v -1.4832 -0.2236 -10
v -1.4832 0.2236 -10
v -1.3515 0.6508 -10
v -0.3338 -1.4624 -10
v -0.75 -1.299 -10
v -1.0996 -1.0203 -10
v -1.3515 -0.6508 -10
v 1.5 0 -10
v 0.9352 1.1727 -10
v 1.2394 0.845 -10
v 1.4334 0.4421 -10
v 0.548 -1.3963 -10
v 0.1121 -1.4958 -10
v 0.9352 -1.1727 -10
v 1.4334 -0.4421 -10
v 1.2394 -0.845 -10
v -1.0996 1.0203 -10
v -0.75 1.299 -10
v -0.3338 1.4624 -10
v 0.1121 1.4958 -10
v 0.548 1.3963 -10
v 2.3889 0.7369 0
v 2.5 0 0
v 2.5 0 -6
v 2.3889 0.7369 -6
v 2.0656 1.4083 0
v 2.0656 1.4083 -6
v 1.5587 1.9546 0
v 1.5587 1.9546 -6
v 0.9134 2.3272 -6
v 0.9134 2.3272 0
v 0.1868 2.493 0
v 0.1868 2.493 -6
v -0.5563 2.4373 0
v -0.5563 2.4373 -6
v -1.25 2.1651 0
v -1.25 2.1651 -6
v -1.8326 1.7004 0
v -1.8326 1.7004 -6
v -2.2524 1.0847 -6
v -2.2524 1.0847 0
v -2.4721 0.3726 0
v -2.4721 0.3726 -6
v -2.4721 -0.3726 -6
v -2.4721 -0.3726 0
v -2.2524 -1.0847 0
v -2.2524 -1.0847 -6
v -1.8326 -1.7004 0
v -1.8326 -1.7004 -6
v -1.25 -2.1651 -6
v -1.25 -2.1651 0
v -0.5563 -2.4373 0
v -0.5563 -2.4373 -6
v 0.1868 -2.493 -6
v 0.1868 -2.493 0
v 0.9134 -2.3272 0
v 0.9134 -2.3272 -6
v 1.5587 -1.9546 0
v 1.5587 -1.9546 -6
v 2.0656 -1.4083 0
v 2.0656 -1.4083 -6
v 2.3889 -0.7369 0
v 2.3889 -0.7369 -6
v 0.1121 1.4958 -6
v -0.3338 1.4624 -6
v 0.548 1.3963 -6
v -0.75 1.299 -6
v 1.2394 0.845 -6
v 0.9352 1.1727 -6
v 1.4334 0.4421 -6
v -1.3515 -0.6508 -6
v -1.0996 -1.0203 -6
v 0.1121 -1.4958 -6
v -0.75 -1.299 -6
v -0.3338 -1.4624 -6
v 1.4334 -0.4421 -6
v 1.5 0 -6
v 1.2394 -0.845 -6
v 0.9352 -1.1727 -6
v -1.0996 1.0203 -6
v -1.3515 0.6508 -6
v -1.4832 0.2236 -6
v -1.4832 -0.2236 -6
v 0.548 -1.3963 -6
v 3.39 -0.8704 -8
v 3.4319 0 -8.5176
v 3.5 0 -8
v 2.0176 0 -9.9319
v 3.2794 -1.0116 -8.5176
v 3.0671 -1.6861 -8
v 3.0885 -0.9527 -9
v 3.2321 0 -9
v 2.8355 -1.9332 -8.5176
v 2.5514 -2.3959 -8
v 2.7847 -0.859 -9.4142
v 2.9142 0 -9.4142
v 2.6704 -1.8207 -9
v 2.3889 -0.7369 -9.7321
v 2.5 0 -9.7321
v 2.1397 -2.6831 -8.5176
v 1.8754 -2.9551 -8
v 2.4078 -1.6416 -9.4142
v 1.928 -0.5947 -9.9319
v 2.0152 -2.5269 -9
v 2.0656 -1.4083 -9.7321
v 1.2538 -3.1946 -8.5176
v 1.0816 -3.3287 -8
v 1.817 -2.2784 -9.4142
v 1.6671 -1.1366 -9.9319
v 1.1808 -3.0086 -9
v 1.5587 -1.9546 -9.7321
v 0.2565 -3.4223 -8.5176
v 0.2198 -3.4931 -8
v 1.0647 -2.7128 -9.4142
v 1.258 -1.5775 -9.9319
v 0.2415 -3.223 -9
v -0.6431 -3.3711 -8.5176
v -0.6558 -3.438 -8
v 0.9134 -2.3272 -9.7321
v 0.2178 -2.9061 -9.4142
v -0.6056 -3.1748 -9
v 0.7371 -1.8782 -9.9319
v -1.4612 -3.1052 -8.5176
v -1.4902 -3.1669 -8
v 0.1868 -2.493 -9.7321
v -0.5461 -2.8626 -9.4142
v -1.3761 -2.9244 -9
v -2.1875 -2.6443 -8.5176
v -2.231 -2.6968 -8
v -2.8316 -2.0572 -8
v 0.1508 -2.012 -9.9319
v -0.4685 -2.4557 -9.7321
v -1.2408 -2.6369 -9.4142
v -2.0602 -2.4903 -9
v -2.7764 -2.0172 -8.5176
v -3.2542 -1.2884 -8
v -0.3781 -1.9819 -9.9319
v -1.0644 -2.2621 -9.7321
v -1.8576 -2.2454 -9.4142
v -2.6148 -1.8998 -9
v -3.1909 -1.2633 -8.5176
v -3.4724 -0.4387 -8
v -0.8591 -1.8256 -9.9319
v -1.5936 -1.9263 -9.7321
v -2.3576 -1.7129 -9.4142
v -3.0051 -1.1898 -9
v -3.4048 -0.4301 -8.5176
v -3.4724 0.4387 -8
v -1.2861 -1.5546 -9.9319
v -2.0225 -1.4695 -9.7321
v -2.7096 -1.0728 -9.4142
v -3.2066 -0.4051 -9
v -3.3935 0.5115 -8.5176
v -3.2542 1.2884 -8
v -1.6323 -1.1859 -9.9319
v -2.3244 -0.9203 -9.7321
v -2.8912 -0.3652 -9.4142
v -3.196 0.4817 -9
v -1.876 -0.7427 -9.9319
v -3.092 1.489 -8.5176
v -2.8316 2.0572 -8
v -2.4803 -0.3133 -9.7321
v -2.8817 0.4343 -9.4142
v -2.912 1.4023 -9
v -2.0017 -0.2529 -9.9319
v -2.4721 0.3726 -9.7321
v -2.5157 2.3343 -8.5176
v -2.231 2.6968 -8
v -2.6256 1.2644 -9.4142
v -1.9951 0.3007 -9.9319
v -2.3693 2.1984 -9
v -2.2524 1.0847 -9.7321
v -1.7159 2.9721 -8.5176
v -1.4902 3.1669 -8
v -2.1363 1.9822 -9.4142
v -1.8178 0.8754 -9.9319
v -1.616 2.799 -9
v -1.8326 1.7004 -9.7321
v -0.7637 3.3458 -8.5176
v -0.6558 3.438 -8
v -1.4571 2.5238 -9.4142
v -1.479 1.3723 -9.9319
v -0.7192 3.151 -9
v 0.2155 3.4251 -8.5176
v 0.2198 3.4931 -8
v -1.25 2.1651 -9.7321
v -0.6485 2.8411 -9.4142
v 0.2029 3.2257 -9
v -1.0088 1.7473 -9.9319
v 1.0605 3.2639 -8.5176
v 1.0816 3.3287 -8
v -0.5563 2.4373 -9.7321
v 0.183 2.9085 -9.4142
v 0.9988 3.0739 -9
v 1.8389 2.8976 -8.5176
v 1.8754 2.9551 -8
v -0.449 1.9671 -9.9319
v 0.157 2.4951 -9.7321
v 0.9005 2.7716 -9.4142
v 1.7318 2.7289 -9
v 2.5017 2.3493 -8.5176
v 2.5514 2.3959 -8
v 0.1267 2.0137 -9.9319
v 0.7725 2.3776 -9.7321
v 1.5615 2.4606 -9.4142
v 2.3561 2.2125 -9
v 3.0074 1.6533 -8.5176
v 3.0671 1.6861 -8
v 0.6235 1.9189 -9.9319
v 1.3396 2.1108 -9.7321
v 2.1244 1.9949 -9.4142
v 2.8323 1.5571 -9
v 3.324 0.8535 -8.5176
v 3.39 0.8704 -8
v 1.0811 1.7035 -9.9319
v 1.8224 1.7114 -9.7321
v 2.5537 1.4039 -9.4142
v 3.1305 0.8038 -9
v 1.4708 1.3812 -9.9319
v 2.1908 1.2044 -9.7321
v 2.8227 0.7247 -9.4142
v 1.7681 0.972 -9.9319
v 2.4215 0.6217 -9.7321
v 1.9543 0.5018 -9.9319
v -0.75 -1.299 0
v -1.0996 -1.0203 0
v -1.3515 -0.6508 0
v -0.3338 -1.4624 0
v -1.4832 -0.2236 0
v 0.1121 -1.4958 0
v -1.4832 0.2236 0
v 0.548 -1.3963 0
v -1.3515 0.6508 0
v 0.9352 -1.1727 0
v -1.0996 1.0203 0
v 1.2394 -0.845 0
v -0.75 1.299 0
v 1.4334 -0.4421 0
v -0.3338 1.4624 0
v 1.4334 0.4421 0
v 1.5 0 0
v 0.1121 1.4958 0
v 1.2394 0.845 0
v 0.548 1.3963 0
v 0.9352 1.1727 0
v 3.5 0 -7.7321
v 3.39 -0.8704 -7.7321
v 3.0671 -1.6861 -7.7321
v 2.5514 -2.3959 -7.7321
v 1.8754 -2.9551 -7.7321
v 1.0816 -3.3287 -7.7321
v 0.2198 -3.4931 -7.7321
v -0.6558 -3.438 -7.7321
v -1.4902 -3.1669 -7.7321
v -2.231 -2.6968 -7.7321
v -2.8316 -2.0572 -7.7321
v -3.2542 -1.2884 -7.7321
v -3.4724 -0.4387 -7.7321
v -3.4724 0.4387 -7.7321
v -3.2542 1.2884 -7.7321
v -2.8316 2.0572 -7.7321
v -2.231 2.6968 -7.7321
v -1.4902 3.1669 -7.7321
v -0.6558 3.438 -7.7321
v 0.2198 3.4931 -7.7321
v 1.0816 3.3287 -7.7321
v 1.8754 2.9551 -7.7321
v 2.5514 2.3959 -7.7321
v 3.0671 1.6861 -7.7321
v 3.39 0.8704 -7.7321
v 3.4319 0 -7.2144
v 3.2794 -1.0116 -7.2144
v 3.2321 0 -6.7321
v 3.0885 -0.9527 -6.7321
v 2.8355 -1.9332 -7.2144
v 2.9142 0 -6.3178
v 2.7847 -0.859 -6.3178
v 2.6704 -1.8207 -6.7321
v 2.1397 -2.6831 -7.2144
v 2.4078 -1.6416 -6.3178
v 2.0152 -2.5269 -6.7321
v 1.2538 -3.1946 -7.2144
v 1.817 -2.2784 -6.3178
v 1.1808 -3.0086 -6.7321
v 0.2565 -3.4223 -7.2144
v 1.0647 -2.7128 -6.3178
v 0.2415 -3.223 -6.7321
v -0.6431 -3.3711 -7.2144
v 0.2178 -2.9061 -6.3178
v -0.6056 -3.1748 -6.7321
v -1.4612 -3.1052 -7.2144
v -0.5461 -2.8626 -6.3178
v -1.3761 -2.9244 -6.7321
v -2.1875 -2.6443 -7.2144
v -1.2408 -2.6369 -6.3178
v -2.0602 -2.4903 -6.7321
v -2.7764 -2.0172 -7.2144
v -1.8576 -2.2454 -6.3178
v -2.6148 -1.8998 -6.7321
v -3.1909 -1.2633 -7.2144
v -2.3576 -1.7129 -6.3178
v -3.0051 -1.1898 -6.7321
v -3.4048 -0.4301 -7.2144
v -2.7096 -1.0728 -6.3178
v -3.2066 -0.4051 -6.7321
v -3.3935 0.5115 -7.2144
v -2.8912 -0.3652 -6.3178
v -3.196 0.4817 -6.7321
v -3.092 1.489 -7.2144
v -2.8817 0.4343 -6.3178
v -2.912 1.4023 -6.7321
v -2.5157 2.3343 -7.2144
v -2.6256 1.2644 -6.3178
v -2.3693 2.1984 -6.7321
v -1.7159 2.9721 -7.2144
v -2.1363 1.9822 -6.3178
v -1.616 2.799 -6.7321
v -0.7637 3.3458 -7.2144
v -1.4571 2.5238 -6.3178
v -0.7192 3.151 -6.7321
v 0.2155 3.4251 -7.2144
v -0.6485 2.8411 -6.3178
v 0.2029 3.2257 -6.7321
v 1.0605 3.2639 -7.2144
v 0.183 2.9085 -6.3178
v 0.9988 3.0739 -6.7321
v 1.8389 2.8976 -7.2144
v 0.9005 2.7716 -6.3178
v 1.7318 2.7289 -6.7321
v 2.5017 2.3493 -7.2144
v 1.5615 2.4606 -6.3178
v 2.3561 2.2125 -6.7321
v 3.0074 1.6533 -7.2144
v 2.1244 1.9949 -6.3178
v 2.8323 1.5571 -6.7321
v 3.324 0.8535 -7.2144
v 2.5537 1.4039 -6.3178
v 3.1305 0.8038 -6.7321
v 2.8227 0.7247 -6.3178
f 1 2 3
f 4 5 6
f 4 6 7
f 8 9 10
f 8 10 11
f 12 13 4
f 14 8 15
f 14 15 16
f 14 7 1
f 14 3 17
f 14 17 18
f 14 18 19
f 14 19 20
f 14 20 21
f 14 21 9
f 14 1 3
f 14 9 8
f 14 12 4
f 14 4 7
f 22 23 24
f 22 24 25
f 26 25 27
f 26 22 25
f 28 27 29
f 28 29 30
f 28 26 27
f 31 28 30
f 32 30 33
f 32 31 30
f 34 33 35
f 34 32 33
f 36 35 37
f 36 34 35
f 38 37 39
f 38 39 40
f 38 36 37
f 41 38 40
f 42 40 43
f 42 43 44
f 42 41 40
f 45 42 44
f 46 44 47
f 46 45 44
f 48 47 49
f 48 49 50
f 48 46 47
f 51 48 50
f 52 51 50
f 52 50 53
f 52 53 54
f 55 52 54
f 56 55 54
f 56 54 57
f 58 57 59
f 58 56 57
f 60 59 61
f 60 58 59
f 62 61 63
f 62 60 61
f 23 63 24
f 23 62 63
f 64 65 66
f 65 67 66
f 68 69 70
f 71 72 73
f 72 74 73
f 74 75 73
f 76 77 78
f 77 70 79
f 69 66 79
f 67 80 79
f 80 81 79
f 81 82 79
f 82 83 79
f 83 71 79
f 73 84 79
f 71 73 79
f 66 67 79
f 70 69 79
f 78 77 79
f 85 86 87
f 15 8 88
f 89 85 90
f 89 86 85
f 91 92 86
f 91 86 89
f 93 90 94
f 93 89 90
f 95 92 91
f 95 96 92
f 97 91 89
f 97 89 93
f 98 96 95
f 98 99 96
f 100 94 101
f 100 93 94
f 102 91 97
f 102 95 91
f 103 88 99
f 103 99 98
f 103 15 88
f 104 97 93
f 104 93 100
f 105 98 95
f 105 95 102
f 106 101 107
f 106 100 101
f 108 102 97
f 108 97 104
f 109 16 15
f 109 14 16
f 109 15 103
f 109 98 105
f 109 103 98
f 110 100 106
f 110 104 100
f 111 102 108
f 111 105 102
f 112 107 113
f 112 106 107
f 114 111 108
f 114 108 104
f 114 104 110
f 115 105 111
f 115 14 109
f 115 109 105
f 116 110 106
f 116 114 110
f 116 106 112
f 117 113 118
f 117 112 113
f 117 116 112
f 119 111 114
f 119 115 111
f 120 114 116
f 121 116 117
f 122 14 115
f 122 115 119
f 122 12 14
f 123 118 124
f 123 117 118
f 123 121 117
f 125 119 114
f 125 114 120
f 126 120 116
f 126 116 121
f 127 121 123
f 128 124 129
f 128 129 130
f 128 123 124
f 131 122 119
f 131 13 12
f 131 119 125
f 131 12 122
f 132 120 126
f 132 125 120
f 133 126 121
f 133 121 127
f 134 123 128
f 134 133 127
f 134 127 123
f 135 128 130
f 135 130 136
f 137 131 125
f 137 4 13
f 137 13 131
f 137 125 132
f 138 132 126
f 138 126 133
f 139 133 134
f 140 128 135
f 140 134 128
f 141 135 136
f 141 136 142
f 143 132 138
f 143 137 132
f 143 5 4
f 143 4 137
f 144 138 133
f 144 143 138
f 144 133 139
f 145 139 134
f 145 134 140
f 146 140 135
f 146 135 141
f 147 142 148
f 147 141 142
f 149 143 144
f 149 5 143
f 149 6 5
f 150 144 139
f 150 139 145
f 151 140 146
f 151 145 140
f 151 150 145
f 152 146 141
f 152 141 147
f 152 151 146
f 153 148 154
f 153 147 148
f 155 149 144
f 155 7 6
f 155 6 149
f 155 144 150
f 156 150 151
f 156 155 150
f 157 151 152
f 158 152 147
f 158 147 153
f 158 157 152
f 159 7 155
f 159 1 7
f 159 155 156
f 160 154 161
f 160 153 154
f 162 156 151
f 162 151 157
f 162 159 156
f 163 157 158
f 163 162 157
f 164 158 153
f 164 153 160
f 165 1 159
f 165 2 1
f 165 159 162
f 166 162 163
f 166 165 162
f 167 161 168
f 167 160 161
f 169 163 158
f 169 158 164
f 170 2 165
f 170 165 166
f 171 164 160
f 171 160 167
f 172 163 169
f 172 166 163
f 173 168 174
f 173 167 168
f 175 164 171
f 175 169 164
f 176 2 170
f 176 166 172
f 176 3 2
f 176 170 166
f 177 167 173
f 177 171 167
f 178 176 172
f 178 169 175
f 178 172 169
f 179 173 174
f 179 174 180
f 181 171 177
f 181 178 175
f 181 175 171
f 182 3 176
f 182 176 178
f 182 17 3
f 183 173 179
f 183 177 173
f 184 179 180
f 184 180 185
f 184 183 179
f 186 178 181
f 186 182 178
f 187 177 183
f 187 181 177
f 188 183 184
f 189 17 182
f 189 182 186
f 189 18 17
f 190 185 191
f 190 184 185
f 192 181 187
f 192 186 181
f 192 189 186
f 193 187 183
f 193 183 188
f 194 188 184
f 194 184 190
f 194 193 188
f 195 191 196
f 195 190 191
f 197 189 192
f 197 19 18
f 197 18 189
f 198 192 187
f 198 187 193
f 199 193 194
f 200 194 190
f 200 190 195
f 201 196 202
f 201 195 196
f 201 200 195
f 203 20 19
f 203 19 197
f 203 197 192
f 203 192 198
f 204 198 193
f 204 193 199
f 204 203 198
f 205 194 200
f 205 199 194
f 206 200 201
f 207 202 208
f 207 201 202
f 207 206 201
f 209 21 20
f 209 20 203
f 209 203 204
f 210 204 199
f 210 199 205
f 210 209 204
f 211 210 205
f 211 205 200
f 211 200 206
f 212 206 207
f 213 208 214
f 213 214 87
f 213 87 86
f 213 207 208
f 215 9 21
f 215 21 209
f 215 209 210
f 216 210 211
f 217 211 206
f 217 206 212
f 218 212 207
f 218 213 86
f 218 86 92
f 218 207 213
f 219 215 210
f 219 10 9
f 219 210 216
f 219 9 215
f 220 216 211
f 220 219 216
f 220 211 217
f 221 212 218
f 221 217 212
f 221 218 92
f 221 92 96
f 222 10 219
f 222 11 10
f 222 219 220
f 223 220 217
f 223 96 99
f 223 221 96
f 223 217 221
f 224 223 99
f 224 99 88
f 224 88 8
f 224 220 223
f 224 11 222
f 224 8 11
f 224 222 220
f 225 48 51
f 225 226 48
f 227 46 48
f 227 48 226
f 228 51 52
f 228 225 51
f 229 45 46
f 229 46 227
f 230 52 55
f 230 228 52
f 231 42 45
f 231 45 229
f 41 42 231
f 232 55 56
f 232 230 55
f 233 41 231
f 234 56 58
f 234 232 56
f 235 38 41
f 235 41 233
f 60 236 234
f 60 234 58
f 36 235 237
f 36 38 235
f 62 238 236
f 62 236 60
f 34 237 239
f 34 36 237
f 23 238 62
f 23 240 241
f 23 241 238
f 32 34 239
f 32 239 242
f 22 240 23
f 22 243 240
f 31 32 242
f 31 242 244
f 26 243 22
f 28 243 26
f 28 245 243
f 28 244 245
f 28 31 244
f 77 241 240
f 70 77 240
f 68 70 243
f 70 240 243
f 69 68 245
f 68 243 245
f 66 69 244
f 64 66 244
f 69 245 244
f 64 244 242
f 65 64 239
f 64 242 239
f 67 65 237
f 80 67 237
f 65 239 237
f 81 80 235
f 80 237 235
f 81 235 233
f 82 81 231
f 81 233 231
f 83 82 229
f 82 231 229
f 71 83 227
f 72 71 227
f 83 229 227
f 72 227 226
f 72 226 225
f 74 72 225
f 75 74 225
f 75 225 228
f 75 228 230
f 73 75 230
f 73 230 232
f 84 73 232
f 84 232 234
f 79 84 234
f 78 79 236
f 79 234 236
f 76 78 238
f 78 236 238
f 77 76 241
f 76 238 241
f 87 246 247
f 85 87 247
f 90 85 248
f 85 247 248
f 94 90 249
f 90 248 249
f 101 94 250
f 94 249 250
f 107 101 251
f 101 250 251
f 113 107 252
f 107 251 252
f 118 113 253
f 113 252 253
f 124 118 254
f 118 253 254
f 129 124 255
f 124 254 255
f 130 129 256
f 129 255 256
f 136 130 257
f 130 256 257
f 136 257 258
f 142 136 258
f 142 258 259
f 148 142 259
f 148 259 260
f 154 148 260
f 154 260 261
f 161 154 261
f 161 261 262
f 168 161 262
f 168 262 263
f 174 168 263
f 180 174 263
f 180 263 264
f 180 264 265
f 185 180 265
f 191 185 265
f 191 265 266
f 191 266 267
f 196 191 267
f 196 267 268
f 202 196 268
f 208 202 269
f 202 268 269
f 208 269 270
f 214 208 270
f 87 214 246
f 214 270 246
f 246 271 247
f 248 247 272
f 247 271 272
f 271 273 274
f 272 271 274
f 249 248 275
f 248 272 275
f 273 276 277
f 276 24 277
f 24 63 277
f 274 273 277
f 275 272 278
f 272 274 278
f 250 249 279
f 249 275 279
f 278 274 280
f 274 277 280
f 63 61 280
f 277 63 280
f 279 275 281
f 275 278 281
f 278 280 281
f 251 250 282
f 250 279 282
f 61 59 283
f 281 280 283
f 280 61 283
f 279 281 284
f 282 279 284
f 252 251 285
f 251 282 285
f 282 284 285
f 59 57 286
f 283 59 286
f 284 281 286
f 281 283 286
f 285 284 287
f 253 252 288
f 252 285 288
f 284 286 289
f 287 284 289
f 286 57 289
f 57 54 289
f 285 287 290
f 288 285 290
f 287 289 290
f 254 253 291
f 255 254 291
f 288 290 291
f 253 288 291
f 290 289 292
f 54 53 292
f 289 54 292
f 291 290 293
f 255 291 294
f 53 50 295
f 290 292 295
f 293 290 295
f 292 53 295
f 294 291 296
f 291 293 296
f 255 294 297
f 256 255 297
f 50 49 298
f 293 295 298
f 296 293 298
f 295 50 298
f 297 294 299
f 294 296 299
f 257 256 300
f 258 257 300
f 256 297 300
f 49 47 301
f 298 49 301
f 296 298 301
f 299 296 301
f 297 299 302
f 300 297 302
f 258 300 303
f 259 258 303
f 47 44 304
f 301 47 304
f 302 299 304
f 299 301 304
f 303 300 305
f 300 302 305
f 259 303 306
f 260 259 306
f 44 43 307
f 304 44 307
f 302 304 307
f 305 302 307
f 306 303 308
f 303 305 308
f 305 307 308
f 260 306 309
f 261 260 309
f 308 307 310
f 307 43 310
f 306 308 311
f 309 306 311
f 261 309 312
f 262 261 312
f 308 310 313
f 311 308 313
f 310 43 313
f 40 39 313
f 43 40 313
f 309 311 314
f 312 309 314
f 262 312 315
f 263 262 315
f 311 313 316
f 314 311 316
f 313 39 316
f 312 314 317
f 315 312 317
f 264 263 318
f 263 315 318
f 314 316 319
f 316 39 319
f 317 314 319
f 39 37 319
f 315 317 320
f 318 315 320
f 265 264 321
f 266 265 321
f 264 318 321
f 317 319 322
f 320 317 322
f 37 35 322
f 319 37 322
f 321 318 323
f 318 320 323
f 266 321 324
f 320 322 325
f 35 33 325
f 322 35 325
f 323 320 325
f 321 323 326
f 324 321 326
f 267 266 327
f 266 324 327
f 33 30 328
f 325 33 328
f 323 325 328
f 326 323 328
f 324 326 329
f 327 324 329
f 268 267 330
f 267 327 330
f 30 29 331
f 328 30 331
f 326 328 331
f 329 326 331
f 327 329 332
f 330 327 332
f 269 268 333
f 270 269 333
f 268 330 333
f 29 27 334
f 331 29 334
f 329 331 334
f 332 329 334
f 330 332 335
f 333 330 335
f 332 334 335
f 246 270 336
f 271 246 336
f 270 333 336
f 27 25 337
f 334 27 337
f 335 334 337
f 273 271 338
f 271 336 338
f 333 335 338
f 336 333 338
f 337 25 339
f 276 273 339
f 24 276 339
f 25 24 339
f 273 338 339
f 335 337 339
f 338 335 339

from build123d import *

# Parameters (mm, degrees)
F0_R     = 2.5
F0_R_2   = 1.5
F1_DEPTH = 6
F2_DEPTH = 7
F3_R     = 3.5
F3_R_2   = 2.5
F3_R_3   = 1.5
F4_DEPTH = 4


# Not quite as in the source:
# - a fillet or chamfer that OpenCascade refuses, or shapes differently, is made with other operations: its cross-section is extruded or revolved along the edge and cut away or added


with BuildPart() as f1:
    # F0 (on Top) → F1 (new body)
    with BuildSketch(Plane.XY):
        Circle(F0_R)
        Circle(F0_R_2, mode=Mode.SUBTRACT)
    extrude(amount=-F1_DEPTH)

    # F0 (on Top) → F2 (cut)
    with BuildSketch(Plane.XY):
        Circle(F0_R_2)
    extrude(amount=-F2_DEPTH, mode=Mode.SUBTRACT)

    # F3 (on face) → F4 (join)
    with BuildSketch(Plane(origin=(0, 0, -6), x_dir=(1, 0, 0), z_dir=(0, 0, -1))):
        Circle(F3_R)
        Circle(F3_R_2, mode=Mode.SUBTRACT)
        Circle(F3_R_2)
        Circle(F3_R_3, mode=Mode.SUBTRACT)
        Circle(F3_R_3)
    extrude(amount=F4_DEPTH)

    # F5: fillet of radius 2 on 2 edges, made by hand

    # F5_s1 → F5_t2 (revolve, cut)
    with BuildSketch(Plane.XZ):
        with BuildLine():
            ThreePointArc((3.5, -8), (2.9142135624, -9.4142135624), (1.5, -10))
            Line((1.5, -10), (3.5, -10))
            Line((3.5, -10), (3.5, -8))
        make_face()
    revolve(axis=Axis((0, 0, -10), (0, 0, -1)), mode=Mode.SUBTRACT)

    # F5_s3 → F5_t4 (revolve, cut)
    with BuildSketch(Plane.XZ):
        with BuildLine():
            ThreePointArc((3.5, -7.7320508076), (3.2320508076, -6.7320508076), (2.5, -6))
            Line((2.5, -6), (3.5, -6))
            Line((3.5, -6), (3.5, -7.7320508076))
        make_face()
    revolve(axis=Axis((0, 0, -6), (0, 0, -1)), mode=Mode.SUBTRACT)


solid = f1.part
